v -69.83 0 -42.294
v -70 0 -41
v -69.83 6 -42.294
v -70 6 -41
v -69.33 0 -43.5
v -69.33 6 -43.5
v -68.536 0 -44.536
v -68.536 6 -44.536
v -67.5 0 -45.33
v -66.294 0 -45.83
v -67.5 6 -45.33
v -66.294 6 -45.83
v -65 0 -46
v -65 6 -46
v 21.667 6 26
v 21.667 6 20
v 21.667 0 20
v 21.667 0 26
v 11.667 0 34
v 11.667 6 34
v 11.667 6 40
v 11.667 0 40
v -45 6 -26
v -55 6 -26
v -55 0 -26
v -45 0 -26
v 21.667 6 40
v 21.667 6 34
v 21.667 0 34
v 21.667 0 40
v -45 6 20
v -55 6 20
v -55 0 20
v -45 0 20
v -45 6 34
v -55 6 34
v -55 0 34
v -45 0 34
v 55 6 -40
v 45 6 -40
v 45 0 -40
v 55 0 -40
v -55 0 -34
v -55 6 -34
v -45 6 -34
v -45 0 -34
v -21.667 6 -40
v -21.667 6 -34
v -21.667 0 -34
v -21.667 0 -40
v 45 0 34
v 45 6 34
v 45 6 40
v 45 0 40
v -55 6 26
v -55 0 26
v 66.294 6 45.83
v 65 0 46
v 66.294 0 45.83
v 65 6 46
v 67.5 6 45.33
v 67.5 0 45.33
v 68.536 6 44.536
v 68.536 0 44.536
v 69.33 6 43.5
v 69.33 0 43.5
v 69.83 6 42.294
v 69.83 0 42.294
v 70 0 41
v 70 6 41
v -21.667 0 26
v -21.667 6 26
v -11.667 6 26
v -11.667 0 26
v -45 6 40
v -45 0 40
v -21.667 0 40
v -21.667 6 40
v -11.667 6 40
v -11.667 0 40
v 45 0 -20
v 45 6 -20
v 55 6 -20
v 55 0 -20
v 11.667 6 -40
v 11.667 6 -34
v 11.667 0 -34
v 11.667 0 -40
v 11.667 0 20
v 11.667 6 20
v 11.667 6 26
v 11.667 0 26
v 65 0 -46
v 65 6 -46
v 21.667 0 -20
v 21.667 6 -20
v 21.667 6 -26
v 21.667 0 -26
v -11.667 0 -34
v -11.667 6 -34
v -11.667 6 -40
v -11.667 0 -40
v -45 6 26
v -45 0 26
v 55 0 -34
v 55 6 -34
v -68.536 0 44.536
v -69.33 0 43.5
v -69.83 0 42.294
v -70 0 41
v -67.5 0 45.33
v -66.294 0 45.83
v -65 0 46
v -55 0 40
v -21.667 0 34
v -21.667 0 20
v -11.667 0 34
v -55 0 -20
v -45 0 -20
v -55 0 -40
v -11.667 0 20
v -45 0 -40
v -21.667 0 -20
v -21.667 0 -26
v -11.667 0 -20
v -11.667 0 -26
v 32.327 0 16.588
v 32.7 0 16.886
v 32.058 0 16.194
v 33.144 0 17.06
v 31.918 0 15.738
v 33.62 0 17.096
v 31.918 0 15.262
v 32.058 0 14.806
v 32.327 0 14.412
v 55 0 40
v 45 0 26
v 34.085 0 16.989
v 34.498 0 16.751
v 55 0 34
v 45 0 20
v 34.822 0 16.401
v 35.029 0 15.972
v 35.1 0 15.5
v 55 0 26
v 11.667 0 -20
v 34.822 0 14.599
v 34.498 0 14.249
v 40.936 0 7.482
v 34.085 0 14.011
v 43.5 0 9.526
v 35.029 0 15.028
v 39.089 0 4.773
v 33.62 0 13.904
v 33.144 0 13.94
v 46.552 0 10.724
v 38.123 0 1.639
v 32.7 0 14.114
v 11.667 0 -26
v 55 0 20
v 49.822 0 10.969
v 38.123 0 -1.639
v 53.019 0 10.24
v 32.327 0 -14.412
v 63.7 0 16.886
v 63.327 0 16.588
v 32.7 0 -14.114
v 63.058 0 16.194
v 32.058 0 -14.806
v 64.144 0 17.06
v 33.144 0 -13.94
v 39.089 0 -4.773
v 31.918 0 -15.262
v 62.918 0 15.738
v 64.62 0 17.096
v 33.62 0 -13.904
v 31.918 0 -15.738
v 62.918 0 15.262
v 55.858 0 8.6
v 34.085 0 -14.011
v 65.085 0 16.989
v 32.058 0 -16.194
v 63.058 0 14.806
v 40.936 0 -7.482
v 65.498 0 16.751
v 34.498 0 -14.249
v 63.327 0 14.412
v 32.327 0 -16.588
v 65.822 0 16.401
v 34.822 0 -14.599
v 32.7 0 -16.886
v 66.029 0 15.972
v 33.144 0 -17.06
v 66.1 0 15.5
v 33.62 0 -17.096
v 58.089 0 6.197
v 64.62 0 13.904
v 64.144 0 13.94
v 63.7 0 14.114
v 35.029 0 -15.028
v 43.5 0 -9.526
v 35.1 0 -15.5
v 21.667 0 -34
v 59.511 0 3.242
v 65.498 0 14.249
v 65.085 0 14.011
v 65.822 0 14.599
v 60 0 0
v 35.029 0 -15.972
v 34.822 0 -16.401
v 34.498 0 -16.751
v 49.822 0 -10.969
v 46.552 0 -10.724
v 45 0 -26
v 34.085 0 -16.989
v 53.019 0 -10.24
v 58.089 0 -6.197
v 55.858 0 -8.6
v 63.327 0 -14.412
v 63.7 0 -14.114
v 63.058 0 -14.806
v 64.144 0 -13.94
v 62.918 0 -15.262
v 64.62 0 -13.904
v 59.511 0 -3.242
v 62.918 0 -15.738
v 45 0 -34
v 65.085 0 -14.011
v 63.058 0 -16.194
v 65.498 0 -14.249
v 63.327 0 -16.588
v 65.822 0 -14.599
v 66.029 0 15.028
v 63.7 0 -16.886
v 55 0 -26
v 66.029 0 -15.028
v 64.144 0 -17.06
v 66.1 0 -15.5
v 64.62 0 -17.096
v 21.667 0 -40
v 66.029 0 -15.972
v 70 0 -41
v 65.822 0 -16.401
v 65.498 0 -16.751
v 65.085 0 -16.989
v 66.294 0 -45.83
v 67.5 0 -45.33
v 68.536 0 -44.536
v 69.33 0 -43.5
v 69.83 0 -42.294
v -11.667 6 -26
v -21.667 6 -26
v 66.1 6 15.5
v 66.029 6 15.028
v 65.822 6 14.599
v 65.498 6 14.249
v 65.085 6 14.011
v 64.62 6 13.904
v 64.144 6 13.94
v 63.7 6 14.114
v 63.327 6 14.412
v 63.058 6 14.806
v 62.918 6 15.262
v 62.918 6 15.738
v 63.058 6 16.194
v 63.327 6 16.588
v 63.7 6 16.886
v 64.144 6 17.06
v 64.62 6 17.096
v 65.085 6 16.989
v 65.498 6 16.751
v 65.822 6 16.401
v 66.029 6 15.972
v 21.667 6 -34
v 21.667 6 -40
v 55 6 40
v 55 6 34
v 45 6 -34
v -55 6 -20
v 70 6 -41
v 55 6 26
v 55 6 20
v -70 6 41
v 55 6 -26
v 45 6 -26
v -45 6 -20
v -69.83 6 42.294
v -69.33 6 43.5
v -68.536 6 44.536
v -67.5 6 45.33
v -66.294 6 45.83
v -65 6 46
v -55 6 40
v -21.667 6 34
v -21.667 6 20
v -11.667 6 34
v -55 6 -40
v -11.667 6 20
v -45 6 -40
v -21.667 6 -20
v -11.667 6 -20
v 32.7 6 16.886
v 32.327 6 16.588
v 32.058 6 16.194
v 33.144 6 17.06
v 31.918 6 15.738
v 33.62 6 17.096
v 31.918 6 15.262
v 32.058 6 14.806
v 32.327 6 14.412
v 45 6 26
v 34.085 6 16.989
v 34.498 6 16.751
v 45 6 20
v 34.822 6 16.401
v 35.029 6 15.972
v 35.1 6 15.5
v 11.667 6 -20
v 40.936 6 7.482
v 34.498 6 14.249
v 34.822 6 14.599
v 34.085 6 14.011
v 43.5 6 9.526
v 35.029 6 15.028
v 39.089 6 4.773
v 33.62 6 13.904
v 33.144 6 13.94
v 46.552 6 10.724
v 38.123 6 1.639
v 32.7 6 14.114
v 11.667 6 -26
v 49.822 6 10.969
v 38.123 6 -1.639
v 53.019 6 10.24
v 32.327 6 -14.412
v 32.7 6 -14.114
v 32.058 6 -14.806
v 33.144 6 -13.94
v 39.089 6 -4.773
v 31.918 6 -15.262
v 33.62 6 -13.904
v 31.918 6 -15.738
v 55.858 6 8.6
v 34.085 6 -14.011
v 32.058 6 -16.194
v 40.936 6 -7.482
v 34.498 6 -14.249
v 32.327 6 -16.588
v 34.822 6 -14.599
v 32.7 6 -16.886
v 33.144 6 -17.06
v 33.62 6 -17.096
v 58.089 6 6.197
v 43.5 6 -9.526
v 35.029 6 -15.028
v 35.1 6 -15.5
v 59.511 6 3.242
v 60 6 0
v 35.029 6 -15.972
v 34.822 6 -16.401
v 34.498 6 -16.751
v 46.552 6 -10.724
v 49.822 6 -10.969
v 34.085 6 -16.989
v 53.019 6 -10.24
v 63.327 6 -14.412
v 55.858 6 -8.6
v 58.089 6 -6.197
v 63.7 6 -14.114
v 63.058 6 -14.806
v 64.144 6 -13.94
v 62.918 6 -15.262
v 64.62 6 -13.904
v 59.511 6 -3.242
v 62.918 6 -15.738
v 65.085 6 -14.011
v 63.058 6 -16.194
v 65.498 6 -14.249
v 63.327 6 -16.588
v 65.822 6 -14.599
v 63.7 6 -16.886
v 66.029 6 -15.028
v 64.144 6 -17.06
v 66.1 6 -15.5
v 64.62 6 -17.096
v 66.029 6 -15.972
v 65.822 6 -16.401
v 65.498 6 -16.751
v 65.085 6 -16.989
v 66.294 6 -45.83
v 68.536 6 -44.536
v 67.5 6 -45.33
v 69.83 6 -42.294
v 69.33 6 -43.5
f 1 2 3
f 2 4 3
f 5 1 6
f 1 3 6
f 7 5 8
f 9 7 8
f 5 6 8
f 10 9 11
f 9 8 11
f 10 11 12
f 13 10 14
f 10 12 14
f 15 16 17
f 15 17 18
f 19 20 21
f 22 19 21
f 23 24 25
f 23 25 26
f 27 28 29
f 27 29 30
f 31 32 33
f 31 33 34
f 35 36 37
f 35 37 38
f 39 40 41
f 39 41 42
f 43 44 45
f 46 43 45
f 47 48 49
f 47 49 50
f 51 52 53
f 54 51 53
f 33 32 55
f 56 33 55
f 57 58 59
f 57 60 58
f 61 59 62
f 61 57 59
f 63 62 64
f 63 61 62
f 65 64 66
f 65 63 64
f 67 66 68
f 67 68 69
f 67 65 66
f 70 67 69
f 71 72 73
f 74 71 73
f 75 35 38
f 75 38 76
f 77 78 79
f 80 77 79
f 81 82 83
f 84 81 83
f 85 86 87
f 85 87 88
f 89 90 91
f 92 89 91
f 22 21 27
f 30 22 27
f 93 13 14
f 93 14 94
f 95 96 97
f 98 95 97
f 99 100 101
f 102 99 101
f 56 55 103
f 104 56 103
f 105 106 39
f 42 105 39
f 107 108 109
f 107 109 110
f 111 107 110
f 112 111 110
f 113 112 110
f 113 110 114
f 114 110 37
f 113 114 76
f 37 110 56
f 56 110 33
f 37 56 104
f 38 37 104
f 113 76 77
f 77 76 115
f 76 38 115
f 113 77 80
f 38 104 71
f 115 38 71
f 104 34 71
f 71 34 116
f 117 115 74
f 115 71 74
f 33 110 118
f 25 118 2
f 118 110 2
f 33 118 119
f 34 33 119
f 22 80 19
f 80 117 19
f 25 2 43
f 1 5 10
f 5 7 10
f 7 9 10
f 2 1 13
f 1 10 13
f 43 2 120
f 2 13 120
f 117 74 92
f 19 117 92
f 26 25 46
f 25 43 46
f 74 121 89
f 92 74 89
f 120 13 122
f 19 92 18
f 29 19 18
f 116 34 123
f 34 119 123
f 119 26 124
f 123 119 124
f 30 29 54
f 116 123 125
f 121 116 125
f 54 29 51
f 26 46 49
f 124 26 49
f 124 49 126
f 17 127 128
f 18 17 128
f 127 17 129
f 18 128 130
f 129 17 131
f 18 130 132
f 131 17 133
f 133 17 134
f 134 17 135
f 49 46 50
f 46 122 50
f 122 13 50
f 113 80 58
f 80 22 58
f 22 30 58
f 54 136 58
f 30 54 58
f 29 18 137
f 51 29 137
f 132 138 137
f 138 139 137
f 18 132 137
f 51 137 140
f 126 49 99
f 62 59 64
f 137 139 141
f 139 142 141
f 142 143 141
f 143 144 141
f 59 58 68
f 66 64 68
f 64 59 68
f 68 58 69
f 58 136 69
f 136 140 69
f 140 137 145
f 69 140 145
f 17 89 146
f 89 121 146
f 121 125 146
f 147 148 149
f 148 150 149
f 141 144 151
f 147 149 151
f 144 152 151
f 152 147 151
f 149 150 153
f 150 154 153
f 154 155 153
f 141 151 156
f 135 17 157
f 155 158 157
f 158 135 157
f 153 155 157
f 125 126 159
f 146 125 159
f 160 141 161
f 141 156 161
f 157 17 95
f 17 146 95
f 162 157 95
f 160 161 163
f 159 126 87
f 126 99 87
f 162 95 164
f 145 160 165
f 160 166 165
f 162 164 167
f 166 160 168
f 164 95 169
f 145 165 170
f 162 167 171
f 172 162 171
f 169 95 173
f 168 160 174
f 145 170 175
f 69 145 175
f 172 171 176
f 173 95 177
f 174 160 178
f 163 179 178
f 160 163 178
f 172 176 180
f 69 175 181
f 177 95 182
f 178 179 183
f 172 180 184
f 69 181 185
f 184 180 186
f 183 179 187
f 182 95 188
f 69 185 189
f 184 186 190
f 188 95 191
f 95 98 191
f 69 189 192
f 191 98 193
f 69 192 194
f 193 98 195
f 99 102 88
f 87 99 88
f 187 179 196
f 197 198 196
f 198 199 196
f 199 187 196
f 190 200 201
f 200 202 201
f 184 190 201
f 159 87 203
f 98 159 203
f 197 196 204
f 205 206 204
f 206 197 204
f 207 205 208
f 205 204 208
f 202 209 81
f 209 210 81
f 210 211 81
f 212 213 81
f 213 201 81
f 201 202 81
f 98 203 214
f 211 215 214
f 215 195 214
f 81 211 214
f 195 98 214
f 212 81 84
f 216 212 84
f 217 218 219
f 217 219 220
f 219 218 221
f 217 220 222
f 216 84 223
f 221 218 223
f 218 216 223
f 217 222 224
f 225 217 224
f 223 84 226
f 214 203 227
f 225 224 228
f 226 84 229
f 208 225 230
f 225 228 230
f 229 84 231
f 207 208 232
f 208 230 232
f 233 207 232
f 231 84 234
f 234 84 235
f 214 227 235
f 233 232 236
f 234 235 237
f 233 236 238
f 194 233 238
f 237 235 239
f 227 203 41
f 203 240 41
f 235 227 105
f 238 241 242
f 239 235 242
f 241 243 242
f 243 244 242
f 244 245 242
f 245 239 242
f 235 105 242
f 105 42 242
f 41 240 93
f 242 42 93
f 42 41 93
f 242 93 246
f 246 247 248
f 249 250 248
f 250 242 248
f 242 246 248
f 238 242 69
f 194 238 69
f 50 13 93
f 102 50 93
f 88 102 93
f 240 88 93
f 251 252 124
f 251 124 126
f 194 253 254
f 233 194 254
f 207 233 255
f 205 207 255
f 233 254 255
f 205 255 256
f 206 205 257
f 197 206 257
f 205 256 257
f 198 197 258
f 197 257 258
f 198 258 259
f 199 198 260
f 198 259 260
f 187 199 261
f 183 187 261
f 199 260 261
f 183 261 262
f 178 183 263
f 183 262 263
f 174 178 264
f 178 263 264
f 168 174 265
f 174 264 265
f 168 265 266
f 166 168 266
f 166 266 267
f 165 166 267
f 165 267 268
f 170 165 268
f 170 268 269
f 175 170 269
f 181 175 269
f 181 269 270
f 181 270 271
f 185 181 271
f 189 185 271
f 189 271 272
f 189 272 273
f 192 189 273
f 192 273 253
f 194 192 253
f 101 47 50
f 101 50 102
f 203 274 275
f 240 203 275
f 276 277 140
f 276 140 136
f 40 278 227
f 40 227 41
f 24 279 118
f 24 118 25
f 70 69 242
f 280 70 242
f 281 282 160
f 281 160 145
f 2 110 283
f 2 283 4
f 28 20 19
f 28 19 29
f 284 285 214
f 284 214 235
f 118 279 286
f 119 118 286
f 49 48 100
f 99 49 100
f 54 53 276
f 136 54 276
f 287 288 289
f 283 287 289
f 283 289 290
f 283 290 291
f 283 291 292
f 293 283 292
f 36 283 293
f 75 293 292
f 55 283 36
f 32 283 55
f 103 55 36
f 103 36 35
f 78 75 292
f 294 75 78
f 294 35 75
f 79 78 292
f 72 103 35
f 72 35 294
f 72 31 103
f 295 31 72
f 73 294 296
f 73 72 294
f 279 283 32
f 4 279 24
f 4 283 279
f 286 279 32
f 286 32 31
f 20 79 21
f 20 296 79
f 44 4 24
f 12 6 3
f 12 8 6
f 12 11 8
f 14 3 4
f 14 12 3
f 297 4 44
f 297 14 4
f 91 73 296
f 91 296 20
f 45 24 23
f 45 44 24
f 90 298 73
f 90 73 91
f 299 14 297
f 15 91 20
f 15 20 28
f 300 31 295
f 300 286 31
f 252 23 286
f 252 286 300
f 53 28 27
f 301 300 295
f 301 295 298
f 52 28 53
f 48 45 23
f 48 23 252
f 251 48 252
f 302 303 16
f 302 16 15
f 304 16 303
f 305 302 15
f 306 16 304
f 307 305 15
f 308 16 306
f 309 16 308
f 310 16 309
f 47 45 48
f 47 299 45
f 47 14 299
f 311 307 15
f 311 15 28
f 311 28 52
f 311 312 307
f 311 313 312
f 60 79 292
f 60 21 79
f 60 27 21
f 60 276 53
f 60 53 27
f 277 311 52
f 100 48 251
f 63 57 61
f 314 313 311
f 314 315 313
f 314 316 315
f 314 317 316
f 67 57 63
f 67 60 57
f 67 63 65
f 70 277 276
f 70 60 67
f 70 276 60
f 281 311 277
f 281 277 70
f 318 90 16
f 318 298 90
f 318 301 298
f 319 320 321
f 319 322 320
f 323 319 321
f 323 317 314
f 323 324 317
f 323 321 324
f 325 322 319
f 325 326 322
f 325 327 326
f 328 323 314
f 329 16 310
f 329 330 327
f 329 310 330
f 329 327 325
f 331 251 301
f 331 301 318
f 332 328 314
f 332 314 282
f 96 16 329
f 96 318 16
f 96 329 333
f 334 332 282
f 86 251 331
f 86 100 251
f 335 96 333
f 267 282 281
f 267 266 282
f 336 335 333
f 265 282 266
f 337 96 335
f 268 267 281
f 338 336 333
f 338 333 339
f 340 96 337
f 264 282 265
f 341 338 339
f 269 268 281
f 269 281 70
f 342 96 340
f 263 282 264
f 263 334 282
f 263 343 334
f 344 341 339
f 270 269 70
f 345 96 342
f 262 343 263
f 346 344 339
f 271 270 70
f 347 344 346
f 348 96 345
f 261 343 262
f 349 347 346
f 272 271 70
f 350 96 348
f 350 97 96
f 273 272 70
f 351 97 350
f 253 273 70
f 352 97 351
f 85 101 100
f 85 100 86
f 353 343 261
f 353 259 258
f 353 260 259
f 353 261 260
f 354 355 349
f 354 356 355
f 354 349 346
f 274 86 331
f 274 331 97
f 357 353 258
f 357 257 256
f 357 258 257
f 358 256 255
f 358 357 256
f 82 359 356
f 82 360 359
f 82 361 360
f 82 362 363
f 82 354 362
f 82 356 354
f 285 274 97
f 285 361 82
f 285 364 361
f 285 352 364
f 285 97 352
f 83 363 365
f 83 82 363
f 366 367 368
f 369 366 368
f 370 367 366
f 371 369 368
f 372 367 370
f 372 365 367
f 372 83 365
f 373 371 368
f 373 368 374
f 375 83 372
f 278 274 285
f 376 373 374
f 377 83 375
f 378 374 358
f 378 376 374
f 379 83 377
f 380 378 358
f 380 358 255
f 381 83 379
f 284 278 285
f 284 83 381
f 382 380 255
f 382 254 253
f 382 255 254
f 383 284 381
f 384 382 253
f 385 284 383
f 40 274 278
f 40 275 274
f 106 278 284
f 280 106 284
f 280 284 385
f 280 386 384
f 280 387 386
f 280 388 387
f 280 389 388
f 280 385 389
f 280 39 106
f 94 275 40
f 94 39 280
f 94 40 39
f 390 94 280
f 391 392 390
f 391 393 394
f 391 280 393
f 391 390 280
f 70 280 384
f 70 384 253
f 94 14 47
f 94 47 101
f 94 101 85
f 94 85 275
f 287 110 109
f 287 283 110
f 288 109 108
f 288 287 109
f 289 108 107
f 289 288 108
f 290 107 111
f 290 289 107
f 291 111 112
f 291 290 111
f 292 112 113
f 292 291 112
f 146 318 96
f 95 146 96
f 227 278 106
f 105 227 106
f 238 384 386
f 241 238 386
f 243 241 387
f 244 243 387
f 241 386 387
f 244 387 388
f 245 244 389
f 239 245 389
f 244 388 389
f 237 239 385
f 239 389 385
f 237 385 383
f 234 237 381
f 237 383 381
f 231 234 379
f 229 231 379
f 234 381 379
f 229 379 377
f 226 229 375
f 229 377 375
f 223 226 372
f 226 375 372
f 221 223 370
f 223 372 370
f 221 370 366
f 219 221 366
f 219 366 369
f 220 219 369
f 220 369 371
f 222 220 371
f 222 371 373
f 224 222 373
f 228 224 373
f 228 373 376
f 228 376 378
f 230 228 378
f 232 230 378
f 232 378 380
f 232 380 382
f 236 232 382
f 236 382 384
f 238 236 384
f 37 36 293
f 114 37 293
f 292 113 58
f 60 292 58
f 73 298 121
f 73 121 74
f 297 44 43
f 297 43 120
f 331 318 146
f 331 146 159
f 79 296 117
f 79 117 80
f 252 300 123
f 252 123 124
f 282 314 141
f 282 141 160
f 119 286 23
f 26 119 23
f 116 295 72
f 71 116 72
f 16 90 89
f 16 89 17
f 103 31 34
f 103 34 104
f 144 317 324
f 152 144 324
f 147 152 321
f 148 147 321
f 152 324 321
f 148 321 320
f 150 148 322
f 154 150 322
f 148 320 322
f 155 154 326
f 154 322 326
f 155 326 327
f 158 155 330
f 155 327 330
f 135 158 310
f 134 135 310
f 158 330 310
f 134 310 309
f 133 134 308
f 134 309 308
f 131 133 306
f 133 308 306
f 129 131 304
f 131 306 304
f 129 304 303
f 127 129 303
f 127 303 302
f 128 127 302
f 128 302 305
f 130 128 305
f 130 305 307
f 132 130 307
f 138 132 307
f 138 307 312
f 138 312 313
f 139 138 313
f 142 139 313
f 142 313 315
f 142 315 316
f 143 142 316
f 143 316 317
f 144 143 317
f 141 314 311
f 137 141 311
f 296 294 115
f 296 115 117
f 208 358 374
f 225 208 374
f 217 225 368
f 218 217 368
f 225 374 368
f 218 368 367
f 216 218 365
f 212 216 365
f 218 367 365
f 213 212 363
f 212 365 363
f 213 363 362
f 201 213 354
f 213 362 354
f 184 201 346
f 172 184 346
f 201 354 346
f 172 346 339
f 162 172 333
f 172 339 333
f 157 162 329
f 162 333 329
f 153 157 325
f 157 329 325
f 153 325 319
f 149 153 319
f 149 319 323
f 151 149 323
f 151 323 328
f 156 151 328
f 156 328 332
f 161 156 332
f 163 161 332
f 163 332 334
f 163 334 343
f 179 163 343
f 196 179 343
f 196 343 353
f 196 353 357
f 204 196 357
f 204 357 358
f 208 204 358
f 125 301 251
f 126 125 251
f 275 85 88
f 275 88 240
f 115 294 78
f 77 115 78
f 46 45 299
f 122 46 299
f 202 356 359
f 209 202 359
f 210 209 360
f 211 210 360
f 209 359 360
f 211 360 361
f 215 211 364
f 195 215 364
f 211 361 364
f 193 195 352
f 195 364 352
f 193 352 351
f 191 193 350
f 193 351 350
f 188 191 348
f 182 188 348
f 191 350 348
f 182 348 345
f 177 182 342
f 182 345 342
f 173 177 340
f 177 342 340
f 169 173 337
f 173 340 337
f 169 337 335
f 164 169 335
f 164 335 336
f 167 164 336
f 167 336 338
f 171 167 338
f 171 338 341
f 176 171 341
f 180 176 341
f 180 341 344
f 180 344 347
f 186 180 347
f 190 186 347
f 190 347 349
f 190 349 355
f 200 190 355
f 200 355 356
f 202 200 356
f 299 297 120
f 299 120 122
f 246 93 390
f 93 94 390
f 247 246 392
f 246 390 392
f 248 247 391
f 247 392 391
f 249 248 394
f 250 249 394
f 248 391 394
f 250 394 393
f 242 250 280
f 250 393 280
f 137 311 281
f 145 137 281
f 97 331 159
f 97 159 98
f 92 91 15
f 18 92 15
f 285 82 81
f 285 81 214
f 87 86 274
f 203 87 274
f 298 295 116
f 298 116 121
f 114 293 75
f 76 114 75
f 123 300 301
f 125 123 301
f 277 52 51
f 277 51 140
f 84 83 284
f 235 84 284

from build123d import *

# Parameters (mm, degrees)
SKETCH1_W            = 140
SKETCH1_H            = 92
BOSS_EXTRUDE1_DEPTH  = 6
SKETCH3_R            = 11
SKETCH3_R_2          = 1.6
CUT_EXTRUDE2_DEPTH   = 7
SKETCH6_W            = 10
SKETCH6_H            = 6
CUT_EXTRUDE12_DEPTH  = 4
SKETCH61_W           = 10
SKETCH61_H           = 6
CUT_EXTRUDE14_DEPTH  = 4
SKETCH62_W           = 10
SKETCH62_H           = 6
CUT_EXTRUDE15_DEPTH  = 4
SKETCH63_W           = 10
SKETCH63_H           = 6
CUT_EXTRUDE16_DEPTH  = 4
SKETCH65_W           = 10
SKETCH65_H           = 6
CUT_EXTRUDE17_DEPTH  = 4
SKETCH66_W           = 10
SKETCH66_H           = 6
CUT_EXTRUDE18_DEPTH  = 4
SKETCH67_W           = 10
SKETCH67_H           = 6
CUT_EXTRUDE19_DEPTH  = 4
SKETCH68_W           = 10
SKETCH68_H           = 6
CUT_EXTRUDE110_DEPTH = 4
FILLET1_R            = 5


with BuildPart() as part:
    # Sketch1 → Boss-Extrude1 (new body)
    with BuildSketch(Plane(origin=(0, 0, 0), x_dir=(1, 0, 0), z_dir=(0, 1, 0))):
        Rectangle(SKETCH1_W, SKETCH1_H)
    extrude(amount=BOSS_EXTRUDE1_DEPTH)

    # Sketch3 → Cut-Extrude2 (cut, through all)
    with BuildSketch(Plane(origin=(0, 6, 0), x_dir=(1, 0, 0), z_dir=(0, 1, 0))):
        with Locations((49, 0)):
            Circle(SKETCH3_R)
        with Locations((33.5, -15.5)):
            Circle(SKETCH3_R_2)
        with Locations((33.5, 15.5)):
            Circle(SKETCH3_R_2)
        with Locations((64.5, 15.5)):
            Circle(SKETCH3_R_2)
        with Locations((64.5, -15.5)):
            Circle(SKETCH3_R_2)
    extrude(amount=-CUT_EXTRUDE2_DEPTH, mode=Mode.SUBTRACT)

    # Sketch6 → Cut-Extrude12 (cut, symmetric)
    with BuildSketch(Plane(origin=(49.232221392, 3, -81), x_dir=(1, 0, 0), z_dir=(0, 1, 0))):
        with Locations((0.767778608, -44)):
            Rectangle(SKETCH6_W, SKETCH6_H)
    cut_extrude12 = extrude(amount=CUT_EXTRUDE12_DEPTH, both=True, mode=Mode.SUBTRACT)

    # Sketch61 → Cut-Extrude14 (cut, symmetric)
    with BuildSketch(Plane(origin=(15.898888059, 3, -81), x_dir=(1, 0, 0), z_dir=(0, 1, 0))):
        with Locations((0.767778608, -44)):
            Rectangle(SKETCH61_W, SKETCH61_H)
    cut_extrude14 = extrude(amount=CUT_EXTRUDE14_DEPTH, both=True, mode=Mode.SUBTRACT)

    # Sketch62 → Cut-Extrude15 (cut, symmetric)
    with BuildSketch(Plane(origin=(-17.434445274, 3, -81), x_dir=(1, 0, 0), z_dir=(0, 1, 0))):
        with Locations((0.767778608, -44)):
            Rectangle(SKETCH62_W, SKETCH62_H)
    cut_extrude15 = extrude(amount=CUT_EXTRUDE15_DEPTH, both=True, mode=Mode.SUBTRACT)

    # Sketch63 → Cut-Extrude16 (cut, symmetric)
    with BuildSketch(Plane(origin=(-50.767778608, 3, -81), x_dir=(1, 0, 0), z_dir=(0, 1, 0))):
        with Locations((0.767778608, -44)):
            Rectangle(SKETCH63_W, SKETCH63_H)
    cut_extrude16 = extrude(amount=CUT_EXTRUDE16_DEPTH, both=True, mode=Mode.SUBTRACT)

    # Sketch65 → Cut-Extrude17 (cut, symmetric)
    with BuildSketch(Plane(origin=(49.232221392, 3, -67), x_dir=(1, 0, 0), z_dir=(0, 1, 0))):
        with Locations((0.767778608, -44)):
            Rectangle(SKETCH65_W, SKETCH65_H)
    cut_extrude17 = extrude(amount=CUT_EXTRUDE17_DEPTH, both=True, mode=Mode.SUBTRACT)

    # Sketch66 → Cut-Extrude18 (cut, symmetric)
    with BuildSketch(Plane(origin=(15.898888059, 3, -67), x_dir=(1, 0, 0), z_dir=(0, 1, 0))):
        with Locations((0.767778608, -44)):
            Rectangle(SKETCH66_W, SKETCH66_H)
    cut_extrude18 = extrude(amount=CUT_EXTRUDE18_DEPTH, both=True, mode=Mode.SUBTRACT)

    # Sketch67 → Cut-Extrude19 (cut, symmetric)
    with BuildSketch(Plane(origin=(-17.434445274, 3, -67), x_dir=(1, 0, 0), z_dir=(0, 1, 0))):
        with Locations((0.767778608, -44)):
            Rectangle(SKETCH67_W, SKETCH67_H)
    cut_extrude19 = extrude(amount=CUT_EXTRUDE19_DEPTH, both=True, mode=Mode.SUBTRACT)

    # Sketch68 → Cut-Extrude110 (cut, symmetric)
    with BuildSketch(Plane(origin=(-50.767778608, 3, -67), x_dir=(1, 0, 0), z_dir=(0, 1, 0))):
        with Locations((0.767778608, -44)):
            Rectangle(SKETCH68_W, SKETCH68_H)
    cut_extrude110 = extrude(amount=CUT_EXTRUDE110_DEPTH, both=True, mode=Mode.SUBTRACT)

    # Mirror1: Cut-Extrude12, Cut-Extrude14, Cut-Extrude15, Cut-Extrude16, Cut-Extrude17, Cut-Extrude18, Cut-Extrude19, Cut-Extrude110 across plane
    add(cut_extrude12.mirror(Plane.XY), mode=Mode.SUBTRACT)
    add(cut_extrude14.mirror(Plane.XY), mode=Mode.SUBTRACT)
    add(cut_extrude15.mirror(Plane.XY), mode=Mode.SUBTRACT)
    add(cut_extrude16.mirror(Plane.XY), mode=Mode.SUBTRACT)
    add(cut_extrude17.mirror(Plane.XY), mode=Mode.SUBTRACT)
    add(cut_extrude18.mirror(Plane.XY), mode=Mode.SUBTRACT)
    add(cut_extrude19.mirror(Plane.XY), mode=Mode.SUBTRACT)
    add(cut_extrude110.mirror(Plane.XY), mode=Mode.SUBTRACT)

    # Fillet1
    fillet1_edges = [part.edges().sort_by_distance(p)[0] for p in [
        (70, 3, 46),
        (-70, 3, 46),
        (-70, 3, -46),
        (70, 3, -46),
    ]]
    fillet(fillet1_edges, radius=FILLET1_R)


solid = part.part
